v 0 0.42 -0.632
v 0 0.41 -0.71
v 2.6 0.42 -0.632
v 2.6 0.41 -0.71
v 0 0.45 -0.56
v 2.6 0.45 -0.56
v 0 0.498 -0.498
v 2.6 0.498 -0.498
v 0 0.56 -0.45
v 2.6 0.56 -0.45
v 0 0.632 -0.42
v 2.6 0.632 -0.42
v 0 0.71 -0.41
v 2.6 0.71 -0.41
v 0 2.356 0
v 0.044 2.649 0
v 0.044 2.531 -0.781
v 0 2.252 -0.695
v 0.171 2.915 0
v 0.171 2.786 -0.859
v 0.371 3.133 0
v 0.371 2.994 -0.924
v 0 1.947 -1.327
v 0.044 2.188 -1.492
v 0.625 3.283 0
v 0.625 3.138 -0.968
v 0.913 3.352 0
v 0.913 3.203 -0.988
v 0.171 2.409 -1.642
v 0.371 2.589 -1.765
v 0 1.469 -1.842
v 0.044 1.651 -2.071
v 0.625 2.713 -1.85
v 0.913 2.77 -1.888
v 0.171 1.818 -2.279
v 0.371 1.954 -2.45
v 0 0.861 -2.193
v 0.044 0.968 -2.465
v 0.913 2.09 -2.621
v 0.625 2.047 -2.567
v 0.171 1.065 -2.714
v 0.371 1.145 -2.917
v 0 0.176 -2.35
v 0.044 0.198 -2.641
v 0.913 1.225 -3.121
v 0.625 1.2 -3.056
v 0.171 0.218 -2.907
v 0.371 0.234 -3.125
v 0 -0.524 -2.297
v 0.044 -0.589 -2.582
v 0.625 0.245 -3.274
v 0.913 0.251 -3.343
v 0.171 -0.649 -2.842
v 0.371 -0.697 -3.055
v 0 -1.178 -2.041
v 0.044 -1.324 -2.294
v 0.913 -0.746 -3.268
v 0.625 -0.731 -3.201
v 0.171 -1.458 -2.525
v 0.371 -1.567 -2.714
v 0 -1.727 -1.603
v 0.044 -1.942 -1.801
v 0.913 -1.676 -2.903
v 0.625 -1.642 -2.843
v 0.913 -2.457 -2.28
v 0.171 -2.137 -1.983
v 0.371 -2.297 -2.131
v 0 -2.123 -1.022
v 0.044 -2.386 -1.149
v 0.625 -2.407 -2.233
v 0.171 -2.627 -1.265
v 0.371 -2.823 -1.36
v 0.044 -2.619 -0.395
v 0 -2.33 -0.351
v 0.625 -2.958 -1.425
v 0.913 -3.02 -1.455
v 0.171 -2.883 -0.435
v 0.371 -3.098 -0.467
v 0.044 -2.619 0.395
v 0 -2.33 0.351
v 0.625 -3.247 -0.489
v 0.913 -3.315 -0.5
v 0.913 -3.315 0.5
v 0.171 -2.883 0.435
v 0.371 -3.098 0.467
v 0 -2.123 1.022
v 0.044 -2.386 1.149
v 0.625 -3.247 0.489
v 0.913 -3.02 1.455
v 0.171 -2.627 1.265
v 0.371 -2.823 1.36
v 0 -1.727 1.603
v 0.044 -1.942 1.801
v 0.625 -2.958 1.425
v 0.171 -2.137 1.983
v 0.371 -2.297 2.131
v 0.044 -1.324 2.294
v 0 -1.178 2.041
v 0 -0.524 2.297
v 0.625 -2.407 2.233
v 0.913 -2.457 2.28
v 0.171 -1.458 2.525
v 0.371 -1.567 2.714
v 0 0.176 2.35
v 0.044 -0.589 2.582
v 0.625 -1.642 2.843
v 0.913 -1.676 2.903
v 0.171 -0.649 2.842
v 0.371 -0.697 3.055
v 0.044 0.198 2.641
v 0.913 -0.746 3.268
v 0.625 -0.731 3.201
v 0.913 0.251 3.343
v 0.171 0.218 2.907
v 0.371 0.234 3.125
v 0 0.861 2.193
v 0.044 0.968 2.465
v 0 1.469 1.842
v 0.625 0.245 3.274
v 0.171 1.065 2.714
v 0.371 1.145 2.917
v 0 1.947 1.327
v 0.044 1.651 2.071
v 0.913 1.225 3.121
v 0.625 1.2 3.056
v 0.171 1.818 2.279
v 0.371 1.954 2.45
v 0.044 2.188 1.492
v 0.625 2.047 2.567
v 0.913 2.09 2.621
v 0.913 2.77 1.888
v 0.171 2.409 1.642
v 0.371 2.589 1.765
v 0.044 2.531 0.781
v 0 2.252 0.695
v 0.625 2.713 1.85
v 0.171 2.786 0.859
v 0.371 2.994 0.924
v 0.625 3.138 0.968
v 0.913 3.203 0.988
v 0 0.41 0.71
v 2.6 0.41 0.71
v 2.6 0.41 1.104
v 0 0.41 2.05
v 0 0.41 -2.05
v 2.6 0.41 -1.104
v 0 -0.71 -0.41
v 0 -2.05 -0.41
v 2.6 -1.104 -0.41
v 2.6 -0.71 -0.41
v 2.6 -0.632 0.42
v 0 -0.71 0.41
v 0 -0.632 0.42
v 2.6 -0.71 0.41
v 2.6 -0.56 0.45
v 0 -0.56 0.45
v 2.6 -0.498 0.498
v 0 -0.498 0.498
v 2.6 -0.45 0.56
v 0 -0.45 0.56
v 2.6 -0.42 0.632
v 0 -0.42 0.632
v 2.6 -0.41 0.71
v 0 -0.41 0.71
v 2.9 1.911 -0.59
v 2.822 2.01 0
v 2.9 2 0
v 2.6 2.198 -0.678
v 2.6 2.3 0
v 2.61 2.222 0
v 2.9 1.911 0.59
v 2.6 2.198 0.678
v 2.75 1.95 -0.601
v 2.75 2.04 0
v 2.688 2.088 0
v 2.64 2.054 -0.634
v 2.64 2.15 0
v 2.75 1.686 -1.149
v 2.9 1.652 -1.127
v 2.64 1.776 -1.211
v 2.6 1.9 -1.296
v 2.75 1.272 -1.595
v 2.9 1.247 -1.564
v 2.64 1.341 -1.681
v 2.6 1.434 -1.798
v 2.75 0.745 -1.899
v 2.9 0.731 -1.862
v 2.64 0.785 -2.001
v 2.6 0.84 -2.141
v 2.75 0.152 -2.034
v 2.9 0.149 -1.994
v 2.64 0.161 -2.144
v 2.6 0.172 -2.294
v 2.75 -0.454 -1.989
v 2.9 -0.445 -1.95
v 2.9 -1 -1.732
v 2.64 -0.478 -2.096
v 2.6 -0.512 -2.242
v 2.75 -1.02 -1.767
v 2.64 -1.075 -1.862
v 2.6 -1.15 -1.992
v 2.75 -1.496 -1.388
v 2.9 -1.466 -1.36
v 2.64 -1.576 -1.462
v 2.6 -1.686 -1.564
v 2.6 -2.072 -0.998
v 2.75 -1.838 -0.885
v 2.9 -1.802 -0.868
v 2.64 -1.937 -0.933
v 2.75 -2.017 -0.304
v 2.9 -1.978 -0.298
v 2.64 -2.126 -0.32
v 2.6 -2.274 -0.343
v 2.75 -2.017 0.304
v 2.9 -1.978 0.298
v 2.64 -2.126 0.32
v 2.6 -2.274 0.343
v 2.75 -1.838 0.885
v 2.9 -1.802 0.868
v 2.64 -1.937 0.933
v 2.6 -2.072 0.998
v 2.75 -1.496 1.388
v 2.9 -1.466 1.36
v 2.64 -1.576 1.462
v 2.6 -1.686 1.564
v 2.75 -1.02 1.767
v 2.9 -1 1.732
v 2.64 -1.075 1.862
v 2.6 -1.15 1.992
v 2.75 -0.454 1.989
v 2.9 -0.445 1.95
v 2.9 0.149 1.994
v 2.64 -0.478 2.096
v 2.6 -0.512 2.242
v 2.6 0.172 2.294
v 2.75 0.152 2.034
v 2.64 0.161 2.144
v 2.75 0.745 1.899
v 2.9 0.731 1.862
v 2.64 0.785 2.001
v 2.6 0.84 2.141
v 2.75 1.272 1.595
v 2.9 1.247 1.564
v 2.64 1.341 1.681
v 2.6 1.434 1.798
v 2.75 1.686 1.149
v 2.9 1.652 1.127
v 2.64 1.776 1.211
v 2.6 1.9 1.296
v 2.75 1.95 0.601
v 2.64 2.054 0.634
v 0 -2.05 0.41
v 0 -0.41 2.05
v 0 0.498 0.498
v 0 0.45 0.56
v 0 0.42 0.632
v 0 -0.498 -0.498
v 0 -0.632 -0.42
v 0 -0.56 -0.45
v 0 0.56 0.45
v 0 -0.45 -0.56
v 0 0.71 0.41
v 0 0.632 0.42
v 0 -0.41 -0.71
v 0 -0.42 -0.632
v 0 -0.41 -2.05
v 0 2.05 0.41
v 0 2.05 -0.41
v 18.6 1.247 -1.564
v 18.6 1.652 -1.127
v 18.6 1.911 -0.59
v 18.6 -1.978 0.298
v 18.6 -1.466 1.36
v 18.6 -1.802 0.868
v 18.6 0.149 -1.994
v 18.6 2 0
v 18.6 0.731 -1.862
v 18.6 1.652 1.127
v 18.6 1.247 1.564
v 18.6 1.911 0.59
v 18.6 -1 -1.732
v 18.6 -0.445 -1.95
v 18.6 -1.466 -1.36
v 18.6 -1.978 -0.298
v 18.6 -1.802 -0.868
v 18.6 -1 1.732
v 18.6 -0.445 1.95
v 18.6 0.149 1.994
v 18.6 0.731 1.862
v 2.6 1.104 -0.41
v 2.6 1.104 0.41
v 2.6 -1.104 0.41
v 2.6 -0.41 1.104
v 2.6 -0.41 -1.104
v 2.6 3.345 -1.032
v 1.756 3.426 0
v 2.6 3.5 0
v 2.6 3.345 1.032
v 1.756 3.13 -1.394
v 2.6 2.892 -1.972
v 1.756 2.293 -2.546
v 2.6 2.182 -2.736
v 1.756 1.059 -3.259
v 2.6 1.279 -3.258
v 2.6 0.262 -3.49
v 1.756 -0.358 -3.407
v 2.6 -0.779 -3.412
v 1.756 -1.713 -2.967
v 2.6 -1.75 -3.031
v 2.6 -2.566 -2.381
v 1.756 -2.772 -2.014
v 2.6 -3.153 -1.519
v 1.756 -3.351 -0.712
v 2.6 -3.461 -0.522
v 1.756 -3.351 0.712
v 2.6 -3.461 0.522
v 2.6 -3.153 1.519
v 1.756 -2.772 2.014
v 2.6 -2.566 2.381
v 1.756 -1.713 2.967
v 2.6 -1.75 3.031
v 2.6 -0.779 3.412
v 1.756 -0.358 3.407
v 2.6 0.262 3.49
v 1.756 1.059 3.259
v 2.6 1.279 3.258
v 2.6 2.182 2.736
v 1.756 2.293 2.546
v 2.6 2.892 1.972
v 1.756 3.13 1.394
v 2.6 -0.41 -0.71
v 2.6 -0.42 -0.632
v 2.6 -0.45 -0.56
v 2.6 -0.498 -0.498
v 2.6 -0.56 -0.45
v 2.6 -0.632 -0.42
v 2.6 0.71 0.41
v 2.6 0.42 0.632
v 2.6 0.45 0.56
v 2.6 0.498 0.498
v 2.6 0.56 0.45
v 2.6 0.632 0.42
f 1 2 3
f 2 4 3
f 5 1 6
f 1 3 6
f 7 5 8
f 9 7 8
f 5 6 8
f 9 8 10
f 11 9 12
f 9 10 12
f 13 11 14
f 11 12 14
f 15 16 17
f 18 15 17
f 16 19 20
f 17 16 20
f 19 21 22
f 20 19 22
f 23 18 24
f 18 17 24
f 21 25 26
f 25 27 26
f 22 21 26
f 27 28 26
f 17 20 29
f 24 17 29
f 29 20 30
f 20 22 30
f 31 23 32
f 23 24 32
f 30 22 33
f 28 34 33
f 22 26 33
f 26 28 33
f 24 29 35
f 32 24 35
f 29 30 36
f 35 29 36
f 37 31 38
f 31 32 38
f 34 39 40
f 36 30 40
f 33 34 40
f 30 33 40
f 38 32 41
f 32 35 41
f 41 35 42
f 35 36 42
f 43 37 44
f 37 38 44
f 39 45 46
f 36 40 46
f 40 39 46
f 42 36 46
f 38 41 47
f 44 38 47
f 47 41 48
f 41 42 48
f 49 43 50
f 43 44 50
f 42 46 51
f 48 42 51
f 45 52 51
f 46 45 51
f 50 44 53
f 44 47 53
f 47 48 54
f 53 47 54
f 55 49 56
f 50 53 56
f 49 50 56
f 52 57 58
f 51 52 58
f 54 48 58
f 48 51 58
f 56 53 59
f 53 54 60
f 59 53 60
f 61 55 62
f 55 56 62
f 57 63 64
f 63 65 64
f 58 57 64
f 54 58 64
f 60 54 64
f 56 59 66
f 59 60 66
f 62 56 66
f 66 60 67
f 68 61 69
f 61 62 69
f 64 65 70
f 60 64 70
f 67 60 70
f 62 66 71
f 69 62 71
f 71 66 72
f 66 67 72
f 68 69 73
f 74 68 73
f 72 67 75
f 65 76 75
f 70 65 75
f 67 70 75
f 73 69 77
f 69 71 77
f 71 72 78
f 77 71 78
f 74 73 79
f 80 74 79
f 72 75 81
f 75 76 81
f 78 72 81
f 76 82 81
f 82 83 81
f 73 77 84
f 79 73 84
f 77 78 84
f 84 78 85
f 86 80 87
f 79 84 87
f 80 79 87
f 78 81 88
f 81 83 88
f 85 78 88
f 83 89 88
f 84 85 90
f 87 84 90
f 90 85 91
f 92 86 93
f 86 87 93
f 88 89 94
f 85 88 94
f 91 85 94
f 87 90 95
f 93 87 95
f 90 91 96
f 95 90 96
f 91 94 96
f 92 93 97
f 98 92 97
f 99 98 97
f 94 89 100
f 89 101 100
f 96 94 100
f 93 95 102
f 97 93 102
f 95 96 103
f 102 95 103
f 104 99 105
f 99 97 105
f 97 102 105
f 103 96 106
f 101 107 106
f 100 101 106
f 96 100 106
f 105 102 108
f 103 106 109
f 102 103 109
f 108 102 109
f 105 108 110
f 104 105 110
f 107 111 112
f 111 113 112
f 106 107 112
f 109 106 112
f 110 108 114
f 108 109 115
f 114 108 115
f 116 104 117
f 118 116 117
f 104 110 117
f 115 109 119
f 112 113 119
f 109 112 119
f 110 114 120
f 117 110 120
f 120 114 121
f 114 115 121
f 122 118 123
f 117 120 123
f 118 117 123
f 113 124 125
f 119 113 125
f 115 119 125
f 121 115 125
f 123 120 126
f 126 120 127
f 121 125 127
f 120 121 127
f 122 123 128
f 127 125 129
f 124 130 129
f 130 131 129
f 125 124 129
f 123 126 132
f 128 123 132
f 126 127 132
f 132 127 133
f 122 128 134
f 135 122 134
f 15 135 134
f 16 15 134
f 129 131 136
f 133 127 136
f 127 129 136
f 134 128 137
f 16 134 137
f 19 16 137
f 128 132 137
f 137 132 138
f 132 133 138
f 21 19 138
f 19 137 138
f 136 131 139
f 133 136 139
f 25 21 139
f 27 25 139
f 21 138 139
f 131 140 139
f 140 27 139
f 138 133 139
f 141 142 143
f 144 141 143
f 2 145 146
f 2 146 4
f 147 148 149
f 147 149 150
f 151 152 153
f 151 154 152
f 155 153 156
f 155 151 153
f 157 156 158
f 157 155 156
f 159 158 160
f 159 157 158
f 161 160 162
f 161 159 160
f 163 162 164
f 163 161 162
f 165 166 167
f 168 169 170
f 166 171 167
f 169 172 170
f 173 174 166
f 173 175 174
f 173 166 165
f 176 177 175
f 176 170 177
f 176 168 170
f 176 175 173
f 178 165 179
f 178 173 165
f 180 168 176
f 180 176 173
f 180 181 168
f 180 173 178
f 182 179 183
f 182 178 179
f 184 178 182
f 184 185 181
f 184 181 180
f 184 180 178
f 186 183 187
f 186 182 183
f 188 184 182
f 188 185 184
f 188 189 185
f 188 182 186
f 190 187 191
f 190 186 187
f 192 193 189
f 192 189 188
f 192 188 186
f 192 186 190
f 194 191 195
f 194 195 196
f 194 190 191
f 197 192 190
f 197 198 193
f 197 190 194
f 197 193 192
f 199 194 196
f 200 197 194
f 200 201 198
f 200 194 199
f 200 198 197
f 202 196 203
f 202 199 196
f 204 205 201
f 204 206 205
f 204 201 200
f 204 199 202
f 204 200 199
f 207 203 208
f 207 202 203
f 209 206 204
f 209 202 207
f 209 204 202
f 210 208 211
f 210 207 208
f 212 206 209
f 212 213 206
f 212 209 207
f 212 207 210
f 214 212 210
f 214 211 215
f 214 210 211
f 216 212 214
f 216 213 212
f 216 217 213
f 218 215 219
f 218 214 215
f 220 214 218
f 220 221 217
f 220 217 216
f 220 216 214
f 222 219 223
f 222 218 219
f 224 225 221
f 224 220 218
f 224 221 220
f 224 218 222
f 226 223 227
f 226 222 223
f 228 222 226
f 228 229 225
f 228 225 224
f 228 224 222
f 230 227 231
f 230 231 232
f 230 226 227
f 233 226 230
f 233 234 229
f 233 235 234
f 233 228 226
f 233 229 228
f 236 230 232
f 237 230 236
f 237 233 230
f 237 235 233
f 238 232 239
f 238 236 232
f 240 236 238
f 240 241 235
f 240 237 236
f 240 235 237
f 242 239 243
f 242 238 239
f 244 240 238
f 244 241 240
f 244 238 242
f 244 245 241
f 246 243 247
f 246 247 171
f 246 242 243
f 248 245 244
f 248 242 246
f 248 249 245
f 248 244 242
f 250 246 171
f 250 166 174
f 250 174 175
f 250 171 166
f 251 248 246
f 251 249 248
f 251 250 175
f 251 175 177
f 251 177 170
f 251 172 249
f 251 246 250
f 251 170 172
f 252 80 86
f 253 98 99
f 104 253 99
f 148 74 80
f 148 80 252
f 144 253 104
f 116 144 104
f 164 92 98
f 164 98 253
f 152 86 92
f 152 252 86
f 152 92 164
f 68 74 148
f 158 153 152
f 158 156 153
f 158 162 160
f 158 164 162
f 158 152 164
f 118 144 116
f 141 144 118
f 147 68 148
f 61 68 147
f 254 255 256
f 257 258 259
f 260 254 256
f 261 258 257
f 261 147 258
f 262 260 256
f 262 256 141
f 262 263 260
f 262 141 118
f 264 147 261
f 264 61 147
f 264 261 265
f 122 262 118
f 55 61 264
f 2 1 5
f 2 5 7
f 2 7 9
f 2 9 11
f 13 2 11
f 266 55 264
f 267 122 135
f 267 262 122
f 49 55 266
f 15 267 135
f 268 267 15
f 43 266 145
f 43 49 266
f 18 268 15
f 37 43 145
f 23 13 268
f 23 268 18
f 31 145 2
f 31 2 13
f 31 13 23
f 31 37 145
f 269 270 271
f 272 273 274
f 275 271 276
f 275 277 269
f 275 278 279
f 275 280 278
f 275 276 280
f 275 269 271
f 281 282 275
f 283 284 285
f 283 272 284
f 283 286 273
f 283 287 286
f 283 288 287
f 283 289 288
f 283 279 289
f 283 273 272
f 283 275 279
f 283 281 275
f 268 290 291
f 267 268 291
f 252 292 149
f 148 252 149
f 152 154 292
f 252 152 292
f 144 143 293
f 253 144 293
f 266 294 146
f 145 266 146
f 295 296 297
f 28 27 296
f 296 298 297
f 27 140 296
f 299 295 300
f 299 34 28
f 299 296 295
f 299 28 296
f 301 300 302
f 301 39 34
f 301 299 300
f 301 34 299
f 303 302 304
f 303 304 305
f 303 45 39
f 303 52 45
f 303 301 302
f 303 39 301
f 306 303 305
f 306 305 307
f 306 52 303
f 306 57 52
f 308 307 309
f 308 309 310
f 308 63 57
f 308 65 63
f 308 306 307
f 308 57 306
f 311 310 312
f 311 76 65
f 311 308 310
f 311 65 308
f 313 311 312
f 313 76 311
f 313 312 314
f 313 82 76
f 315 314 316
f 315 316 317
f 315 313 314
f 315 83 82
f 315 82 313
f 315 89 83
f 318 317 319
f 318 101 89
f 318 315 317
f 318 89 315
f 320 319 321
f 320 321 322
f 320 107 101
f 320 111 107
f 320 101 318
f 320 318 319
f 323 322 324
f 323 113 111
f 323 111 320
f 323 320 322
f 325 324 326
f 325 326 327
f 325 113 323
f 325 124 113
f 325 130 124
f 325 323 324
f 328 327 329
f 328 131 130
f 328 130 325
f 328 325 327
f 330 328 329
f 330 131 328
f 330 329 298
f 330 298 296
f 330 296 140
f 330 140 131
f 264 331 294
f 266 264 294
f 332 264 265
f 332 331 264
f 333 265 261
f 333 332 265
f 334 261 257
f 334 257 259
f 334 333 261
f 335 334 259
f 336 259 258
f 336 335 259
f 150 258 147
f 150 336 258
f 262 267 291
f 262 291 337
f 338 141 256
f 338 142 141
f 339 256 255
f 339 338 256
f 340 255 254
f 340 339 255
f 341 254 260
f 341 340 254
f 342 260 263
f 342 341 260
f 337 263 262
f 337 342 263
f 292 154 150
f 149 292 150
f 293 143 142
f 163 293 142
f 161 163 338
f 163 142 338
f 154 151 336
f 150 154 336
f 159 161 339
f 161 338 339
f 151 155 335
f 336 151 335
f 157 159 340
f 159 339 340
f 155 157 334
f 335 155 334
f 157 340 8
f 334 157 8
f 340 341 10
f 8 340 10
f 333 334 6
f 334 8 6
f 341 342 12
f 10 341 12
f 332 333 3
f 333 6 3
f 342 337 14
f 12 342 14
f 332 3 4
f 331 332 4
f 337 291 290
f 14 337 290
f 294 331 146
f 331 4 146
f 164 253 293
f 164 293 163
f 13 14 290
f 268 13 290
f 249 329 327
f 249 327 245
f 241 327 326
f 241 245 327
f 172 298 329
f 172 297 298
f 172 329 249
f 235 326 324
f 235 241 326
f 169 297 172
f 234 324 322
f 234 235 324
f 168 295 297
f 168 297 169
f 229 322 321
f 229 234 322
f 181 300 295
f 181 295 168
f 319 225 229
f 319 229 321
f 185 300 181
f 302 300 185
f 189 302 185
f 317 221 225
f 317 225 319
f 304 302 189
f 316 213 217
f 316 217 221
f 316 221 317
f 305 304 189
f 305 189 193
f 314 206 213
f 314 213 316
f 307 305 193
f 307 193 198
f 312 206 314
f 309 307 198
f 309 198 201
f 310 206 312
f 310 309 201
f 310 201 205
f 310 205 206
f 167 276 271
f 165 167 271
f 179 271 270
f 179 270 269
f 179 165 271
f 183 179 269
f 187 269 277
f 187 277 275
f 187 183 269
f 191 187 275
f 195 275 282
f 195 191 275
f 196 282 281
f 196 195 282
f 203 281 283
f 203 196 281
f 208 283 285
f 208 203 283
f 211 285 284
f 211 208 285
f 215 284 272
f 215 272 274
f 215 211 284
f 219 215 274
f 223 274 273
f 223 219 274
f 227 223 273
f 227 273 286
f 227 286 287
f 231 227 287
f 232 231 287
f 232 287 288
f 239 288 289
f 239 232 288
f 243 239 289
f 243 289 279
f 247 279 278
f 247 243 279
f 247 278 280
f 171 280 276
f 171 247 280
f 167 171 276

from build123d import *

# Parameters (mm, degrees)
CROSSRECESS_DEPTH = 2.6
FILLET5_R         = 0.3
HEADFILLET_R      = 1
DRAFT1_ANGLE      = 20


with BuildPart() as part:
    # Sketch1 → Base (revolve)
    with BuildSketch(Plane.XY):
        with BuildLine():
            Line((18.6, 2), (4, 2))
            Line((4, 2), (2.9, 2))
            ThreePointArc((2.9, 2), (2.687867966, 2.087867966), (2.6, 2.3))
            Line((2.6, 2.3), (2.6, 3.5))
            Line((2.6, 3.5), (0, 3.272529475))
            Line((0, 3.272529475), (0, 0))
            Line((0, 0), (18.6, 0))
            Line((18.6, 0), (18.6, 2))
        make_face()
    revolve(axis=Axis((4.515812911, 0, 0), (-1, 0, 0)))

    # Sketch6 → CrossRecess (cut)
    with BuildSketch(Plane(origin=(0, 0, 0), x_dir=(0, 0, -1), z_dir=(1, 0, 0))):
        Polygon((0.41, 0.41), (0.41, 2.05), (-0.41, 2.05), (-0.41, 0.41), (-2.05, 0.41), (-2.05, -0.41), (-0.41, -0.41), (-0.41, -2.05), (0.41, -2.05), (0.41, -0.41), (2.05, -0.41), (2.05, 0.41), align=None)
    extrude(amount=CROSSRECESS_DEPTH, mode=Mode.SUBTRACT)

    # Fillet5
    fillet5_edges = [part.edges().sort_by_distance(p)[0] for p in [
        (1.3, 0.41, 0.41),
        (1.3, -0.41, 0.41),
        (1.3, -0.41, -0.41),
        (1.3, 0.41, -0.41),
    ]]
    fillet(fillet5_edges, radius=FILLET5_R)

    # HeadFillet
    headfillet_edges = [part.edges().sort_by_distance(p)[0] for p in [
        (0, -3.272529475, 0),
    ]]
    fillet(headfillet_edges, radius=HEADFILLET_R)

    # Draft1
    draft1_faces = [part.faces().sort_by_distance(p)[0] for p in [
        (1.3, 0, 2.05),
        (1.3, -2.05, 0),
        (1.3, 0, -2.05),
        (1.3, 2.05, 0),
    ]]
    draft(draft1_faces, Plane(origin=(0, 0, 0), x_dir=(0, 0, -1), z_dir=(-1, 0, 0)), DRAFT1_ANGLE)


solid = part.part
